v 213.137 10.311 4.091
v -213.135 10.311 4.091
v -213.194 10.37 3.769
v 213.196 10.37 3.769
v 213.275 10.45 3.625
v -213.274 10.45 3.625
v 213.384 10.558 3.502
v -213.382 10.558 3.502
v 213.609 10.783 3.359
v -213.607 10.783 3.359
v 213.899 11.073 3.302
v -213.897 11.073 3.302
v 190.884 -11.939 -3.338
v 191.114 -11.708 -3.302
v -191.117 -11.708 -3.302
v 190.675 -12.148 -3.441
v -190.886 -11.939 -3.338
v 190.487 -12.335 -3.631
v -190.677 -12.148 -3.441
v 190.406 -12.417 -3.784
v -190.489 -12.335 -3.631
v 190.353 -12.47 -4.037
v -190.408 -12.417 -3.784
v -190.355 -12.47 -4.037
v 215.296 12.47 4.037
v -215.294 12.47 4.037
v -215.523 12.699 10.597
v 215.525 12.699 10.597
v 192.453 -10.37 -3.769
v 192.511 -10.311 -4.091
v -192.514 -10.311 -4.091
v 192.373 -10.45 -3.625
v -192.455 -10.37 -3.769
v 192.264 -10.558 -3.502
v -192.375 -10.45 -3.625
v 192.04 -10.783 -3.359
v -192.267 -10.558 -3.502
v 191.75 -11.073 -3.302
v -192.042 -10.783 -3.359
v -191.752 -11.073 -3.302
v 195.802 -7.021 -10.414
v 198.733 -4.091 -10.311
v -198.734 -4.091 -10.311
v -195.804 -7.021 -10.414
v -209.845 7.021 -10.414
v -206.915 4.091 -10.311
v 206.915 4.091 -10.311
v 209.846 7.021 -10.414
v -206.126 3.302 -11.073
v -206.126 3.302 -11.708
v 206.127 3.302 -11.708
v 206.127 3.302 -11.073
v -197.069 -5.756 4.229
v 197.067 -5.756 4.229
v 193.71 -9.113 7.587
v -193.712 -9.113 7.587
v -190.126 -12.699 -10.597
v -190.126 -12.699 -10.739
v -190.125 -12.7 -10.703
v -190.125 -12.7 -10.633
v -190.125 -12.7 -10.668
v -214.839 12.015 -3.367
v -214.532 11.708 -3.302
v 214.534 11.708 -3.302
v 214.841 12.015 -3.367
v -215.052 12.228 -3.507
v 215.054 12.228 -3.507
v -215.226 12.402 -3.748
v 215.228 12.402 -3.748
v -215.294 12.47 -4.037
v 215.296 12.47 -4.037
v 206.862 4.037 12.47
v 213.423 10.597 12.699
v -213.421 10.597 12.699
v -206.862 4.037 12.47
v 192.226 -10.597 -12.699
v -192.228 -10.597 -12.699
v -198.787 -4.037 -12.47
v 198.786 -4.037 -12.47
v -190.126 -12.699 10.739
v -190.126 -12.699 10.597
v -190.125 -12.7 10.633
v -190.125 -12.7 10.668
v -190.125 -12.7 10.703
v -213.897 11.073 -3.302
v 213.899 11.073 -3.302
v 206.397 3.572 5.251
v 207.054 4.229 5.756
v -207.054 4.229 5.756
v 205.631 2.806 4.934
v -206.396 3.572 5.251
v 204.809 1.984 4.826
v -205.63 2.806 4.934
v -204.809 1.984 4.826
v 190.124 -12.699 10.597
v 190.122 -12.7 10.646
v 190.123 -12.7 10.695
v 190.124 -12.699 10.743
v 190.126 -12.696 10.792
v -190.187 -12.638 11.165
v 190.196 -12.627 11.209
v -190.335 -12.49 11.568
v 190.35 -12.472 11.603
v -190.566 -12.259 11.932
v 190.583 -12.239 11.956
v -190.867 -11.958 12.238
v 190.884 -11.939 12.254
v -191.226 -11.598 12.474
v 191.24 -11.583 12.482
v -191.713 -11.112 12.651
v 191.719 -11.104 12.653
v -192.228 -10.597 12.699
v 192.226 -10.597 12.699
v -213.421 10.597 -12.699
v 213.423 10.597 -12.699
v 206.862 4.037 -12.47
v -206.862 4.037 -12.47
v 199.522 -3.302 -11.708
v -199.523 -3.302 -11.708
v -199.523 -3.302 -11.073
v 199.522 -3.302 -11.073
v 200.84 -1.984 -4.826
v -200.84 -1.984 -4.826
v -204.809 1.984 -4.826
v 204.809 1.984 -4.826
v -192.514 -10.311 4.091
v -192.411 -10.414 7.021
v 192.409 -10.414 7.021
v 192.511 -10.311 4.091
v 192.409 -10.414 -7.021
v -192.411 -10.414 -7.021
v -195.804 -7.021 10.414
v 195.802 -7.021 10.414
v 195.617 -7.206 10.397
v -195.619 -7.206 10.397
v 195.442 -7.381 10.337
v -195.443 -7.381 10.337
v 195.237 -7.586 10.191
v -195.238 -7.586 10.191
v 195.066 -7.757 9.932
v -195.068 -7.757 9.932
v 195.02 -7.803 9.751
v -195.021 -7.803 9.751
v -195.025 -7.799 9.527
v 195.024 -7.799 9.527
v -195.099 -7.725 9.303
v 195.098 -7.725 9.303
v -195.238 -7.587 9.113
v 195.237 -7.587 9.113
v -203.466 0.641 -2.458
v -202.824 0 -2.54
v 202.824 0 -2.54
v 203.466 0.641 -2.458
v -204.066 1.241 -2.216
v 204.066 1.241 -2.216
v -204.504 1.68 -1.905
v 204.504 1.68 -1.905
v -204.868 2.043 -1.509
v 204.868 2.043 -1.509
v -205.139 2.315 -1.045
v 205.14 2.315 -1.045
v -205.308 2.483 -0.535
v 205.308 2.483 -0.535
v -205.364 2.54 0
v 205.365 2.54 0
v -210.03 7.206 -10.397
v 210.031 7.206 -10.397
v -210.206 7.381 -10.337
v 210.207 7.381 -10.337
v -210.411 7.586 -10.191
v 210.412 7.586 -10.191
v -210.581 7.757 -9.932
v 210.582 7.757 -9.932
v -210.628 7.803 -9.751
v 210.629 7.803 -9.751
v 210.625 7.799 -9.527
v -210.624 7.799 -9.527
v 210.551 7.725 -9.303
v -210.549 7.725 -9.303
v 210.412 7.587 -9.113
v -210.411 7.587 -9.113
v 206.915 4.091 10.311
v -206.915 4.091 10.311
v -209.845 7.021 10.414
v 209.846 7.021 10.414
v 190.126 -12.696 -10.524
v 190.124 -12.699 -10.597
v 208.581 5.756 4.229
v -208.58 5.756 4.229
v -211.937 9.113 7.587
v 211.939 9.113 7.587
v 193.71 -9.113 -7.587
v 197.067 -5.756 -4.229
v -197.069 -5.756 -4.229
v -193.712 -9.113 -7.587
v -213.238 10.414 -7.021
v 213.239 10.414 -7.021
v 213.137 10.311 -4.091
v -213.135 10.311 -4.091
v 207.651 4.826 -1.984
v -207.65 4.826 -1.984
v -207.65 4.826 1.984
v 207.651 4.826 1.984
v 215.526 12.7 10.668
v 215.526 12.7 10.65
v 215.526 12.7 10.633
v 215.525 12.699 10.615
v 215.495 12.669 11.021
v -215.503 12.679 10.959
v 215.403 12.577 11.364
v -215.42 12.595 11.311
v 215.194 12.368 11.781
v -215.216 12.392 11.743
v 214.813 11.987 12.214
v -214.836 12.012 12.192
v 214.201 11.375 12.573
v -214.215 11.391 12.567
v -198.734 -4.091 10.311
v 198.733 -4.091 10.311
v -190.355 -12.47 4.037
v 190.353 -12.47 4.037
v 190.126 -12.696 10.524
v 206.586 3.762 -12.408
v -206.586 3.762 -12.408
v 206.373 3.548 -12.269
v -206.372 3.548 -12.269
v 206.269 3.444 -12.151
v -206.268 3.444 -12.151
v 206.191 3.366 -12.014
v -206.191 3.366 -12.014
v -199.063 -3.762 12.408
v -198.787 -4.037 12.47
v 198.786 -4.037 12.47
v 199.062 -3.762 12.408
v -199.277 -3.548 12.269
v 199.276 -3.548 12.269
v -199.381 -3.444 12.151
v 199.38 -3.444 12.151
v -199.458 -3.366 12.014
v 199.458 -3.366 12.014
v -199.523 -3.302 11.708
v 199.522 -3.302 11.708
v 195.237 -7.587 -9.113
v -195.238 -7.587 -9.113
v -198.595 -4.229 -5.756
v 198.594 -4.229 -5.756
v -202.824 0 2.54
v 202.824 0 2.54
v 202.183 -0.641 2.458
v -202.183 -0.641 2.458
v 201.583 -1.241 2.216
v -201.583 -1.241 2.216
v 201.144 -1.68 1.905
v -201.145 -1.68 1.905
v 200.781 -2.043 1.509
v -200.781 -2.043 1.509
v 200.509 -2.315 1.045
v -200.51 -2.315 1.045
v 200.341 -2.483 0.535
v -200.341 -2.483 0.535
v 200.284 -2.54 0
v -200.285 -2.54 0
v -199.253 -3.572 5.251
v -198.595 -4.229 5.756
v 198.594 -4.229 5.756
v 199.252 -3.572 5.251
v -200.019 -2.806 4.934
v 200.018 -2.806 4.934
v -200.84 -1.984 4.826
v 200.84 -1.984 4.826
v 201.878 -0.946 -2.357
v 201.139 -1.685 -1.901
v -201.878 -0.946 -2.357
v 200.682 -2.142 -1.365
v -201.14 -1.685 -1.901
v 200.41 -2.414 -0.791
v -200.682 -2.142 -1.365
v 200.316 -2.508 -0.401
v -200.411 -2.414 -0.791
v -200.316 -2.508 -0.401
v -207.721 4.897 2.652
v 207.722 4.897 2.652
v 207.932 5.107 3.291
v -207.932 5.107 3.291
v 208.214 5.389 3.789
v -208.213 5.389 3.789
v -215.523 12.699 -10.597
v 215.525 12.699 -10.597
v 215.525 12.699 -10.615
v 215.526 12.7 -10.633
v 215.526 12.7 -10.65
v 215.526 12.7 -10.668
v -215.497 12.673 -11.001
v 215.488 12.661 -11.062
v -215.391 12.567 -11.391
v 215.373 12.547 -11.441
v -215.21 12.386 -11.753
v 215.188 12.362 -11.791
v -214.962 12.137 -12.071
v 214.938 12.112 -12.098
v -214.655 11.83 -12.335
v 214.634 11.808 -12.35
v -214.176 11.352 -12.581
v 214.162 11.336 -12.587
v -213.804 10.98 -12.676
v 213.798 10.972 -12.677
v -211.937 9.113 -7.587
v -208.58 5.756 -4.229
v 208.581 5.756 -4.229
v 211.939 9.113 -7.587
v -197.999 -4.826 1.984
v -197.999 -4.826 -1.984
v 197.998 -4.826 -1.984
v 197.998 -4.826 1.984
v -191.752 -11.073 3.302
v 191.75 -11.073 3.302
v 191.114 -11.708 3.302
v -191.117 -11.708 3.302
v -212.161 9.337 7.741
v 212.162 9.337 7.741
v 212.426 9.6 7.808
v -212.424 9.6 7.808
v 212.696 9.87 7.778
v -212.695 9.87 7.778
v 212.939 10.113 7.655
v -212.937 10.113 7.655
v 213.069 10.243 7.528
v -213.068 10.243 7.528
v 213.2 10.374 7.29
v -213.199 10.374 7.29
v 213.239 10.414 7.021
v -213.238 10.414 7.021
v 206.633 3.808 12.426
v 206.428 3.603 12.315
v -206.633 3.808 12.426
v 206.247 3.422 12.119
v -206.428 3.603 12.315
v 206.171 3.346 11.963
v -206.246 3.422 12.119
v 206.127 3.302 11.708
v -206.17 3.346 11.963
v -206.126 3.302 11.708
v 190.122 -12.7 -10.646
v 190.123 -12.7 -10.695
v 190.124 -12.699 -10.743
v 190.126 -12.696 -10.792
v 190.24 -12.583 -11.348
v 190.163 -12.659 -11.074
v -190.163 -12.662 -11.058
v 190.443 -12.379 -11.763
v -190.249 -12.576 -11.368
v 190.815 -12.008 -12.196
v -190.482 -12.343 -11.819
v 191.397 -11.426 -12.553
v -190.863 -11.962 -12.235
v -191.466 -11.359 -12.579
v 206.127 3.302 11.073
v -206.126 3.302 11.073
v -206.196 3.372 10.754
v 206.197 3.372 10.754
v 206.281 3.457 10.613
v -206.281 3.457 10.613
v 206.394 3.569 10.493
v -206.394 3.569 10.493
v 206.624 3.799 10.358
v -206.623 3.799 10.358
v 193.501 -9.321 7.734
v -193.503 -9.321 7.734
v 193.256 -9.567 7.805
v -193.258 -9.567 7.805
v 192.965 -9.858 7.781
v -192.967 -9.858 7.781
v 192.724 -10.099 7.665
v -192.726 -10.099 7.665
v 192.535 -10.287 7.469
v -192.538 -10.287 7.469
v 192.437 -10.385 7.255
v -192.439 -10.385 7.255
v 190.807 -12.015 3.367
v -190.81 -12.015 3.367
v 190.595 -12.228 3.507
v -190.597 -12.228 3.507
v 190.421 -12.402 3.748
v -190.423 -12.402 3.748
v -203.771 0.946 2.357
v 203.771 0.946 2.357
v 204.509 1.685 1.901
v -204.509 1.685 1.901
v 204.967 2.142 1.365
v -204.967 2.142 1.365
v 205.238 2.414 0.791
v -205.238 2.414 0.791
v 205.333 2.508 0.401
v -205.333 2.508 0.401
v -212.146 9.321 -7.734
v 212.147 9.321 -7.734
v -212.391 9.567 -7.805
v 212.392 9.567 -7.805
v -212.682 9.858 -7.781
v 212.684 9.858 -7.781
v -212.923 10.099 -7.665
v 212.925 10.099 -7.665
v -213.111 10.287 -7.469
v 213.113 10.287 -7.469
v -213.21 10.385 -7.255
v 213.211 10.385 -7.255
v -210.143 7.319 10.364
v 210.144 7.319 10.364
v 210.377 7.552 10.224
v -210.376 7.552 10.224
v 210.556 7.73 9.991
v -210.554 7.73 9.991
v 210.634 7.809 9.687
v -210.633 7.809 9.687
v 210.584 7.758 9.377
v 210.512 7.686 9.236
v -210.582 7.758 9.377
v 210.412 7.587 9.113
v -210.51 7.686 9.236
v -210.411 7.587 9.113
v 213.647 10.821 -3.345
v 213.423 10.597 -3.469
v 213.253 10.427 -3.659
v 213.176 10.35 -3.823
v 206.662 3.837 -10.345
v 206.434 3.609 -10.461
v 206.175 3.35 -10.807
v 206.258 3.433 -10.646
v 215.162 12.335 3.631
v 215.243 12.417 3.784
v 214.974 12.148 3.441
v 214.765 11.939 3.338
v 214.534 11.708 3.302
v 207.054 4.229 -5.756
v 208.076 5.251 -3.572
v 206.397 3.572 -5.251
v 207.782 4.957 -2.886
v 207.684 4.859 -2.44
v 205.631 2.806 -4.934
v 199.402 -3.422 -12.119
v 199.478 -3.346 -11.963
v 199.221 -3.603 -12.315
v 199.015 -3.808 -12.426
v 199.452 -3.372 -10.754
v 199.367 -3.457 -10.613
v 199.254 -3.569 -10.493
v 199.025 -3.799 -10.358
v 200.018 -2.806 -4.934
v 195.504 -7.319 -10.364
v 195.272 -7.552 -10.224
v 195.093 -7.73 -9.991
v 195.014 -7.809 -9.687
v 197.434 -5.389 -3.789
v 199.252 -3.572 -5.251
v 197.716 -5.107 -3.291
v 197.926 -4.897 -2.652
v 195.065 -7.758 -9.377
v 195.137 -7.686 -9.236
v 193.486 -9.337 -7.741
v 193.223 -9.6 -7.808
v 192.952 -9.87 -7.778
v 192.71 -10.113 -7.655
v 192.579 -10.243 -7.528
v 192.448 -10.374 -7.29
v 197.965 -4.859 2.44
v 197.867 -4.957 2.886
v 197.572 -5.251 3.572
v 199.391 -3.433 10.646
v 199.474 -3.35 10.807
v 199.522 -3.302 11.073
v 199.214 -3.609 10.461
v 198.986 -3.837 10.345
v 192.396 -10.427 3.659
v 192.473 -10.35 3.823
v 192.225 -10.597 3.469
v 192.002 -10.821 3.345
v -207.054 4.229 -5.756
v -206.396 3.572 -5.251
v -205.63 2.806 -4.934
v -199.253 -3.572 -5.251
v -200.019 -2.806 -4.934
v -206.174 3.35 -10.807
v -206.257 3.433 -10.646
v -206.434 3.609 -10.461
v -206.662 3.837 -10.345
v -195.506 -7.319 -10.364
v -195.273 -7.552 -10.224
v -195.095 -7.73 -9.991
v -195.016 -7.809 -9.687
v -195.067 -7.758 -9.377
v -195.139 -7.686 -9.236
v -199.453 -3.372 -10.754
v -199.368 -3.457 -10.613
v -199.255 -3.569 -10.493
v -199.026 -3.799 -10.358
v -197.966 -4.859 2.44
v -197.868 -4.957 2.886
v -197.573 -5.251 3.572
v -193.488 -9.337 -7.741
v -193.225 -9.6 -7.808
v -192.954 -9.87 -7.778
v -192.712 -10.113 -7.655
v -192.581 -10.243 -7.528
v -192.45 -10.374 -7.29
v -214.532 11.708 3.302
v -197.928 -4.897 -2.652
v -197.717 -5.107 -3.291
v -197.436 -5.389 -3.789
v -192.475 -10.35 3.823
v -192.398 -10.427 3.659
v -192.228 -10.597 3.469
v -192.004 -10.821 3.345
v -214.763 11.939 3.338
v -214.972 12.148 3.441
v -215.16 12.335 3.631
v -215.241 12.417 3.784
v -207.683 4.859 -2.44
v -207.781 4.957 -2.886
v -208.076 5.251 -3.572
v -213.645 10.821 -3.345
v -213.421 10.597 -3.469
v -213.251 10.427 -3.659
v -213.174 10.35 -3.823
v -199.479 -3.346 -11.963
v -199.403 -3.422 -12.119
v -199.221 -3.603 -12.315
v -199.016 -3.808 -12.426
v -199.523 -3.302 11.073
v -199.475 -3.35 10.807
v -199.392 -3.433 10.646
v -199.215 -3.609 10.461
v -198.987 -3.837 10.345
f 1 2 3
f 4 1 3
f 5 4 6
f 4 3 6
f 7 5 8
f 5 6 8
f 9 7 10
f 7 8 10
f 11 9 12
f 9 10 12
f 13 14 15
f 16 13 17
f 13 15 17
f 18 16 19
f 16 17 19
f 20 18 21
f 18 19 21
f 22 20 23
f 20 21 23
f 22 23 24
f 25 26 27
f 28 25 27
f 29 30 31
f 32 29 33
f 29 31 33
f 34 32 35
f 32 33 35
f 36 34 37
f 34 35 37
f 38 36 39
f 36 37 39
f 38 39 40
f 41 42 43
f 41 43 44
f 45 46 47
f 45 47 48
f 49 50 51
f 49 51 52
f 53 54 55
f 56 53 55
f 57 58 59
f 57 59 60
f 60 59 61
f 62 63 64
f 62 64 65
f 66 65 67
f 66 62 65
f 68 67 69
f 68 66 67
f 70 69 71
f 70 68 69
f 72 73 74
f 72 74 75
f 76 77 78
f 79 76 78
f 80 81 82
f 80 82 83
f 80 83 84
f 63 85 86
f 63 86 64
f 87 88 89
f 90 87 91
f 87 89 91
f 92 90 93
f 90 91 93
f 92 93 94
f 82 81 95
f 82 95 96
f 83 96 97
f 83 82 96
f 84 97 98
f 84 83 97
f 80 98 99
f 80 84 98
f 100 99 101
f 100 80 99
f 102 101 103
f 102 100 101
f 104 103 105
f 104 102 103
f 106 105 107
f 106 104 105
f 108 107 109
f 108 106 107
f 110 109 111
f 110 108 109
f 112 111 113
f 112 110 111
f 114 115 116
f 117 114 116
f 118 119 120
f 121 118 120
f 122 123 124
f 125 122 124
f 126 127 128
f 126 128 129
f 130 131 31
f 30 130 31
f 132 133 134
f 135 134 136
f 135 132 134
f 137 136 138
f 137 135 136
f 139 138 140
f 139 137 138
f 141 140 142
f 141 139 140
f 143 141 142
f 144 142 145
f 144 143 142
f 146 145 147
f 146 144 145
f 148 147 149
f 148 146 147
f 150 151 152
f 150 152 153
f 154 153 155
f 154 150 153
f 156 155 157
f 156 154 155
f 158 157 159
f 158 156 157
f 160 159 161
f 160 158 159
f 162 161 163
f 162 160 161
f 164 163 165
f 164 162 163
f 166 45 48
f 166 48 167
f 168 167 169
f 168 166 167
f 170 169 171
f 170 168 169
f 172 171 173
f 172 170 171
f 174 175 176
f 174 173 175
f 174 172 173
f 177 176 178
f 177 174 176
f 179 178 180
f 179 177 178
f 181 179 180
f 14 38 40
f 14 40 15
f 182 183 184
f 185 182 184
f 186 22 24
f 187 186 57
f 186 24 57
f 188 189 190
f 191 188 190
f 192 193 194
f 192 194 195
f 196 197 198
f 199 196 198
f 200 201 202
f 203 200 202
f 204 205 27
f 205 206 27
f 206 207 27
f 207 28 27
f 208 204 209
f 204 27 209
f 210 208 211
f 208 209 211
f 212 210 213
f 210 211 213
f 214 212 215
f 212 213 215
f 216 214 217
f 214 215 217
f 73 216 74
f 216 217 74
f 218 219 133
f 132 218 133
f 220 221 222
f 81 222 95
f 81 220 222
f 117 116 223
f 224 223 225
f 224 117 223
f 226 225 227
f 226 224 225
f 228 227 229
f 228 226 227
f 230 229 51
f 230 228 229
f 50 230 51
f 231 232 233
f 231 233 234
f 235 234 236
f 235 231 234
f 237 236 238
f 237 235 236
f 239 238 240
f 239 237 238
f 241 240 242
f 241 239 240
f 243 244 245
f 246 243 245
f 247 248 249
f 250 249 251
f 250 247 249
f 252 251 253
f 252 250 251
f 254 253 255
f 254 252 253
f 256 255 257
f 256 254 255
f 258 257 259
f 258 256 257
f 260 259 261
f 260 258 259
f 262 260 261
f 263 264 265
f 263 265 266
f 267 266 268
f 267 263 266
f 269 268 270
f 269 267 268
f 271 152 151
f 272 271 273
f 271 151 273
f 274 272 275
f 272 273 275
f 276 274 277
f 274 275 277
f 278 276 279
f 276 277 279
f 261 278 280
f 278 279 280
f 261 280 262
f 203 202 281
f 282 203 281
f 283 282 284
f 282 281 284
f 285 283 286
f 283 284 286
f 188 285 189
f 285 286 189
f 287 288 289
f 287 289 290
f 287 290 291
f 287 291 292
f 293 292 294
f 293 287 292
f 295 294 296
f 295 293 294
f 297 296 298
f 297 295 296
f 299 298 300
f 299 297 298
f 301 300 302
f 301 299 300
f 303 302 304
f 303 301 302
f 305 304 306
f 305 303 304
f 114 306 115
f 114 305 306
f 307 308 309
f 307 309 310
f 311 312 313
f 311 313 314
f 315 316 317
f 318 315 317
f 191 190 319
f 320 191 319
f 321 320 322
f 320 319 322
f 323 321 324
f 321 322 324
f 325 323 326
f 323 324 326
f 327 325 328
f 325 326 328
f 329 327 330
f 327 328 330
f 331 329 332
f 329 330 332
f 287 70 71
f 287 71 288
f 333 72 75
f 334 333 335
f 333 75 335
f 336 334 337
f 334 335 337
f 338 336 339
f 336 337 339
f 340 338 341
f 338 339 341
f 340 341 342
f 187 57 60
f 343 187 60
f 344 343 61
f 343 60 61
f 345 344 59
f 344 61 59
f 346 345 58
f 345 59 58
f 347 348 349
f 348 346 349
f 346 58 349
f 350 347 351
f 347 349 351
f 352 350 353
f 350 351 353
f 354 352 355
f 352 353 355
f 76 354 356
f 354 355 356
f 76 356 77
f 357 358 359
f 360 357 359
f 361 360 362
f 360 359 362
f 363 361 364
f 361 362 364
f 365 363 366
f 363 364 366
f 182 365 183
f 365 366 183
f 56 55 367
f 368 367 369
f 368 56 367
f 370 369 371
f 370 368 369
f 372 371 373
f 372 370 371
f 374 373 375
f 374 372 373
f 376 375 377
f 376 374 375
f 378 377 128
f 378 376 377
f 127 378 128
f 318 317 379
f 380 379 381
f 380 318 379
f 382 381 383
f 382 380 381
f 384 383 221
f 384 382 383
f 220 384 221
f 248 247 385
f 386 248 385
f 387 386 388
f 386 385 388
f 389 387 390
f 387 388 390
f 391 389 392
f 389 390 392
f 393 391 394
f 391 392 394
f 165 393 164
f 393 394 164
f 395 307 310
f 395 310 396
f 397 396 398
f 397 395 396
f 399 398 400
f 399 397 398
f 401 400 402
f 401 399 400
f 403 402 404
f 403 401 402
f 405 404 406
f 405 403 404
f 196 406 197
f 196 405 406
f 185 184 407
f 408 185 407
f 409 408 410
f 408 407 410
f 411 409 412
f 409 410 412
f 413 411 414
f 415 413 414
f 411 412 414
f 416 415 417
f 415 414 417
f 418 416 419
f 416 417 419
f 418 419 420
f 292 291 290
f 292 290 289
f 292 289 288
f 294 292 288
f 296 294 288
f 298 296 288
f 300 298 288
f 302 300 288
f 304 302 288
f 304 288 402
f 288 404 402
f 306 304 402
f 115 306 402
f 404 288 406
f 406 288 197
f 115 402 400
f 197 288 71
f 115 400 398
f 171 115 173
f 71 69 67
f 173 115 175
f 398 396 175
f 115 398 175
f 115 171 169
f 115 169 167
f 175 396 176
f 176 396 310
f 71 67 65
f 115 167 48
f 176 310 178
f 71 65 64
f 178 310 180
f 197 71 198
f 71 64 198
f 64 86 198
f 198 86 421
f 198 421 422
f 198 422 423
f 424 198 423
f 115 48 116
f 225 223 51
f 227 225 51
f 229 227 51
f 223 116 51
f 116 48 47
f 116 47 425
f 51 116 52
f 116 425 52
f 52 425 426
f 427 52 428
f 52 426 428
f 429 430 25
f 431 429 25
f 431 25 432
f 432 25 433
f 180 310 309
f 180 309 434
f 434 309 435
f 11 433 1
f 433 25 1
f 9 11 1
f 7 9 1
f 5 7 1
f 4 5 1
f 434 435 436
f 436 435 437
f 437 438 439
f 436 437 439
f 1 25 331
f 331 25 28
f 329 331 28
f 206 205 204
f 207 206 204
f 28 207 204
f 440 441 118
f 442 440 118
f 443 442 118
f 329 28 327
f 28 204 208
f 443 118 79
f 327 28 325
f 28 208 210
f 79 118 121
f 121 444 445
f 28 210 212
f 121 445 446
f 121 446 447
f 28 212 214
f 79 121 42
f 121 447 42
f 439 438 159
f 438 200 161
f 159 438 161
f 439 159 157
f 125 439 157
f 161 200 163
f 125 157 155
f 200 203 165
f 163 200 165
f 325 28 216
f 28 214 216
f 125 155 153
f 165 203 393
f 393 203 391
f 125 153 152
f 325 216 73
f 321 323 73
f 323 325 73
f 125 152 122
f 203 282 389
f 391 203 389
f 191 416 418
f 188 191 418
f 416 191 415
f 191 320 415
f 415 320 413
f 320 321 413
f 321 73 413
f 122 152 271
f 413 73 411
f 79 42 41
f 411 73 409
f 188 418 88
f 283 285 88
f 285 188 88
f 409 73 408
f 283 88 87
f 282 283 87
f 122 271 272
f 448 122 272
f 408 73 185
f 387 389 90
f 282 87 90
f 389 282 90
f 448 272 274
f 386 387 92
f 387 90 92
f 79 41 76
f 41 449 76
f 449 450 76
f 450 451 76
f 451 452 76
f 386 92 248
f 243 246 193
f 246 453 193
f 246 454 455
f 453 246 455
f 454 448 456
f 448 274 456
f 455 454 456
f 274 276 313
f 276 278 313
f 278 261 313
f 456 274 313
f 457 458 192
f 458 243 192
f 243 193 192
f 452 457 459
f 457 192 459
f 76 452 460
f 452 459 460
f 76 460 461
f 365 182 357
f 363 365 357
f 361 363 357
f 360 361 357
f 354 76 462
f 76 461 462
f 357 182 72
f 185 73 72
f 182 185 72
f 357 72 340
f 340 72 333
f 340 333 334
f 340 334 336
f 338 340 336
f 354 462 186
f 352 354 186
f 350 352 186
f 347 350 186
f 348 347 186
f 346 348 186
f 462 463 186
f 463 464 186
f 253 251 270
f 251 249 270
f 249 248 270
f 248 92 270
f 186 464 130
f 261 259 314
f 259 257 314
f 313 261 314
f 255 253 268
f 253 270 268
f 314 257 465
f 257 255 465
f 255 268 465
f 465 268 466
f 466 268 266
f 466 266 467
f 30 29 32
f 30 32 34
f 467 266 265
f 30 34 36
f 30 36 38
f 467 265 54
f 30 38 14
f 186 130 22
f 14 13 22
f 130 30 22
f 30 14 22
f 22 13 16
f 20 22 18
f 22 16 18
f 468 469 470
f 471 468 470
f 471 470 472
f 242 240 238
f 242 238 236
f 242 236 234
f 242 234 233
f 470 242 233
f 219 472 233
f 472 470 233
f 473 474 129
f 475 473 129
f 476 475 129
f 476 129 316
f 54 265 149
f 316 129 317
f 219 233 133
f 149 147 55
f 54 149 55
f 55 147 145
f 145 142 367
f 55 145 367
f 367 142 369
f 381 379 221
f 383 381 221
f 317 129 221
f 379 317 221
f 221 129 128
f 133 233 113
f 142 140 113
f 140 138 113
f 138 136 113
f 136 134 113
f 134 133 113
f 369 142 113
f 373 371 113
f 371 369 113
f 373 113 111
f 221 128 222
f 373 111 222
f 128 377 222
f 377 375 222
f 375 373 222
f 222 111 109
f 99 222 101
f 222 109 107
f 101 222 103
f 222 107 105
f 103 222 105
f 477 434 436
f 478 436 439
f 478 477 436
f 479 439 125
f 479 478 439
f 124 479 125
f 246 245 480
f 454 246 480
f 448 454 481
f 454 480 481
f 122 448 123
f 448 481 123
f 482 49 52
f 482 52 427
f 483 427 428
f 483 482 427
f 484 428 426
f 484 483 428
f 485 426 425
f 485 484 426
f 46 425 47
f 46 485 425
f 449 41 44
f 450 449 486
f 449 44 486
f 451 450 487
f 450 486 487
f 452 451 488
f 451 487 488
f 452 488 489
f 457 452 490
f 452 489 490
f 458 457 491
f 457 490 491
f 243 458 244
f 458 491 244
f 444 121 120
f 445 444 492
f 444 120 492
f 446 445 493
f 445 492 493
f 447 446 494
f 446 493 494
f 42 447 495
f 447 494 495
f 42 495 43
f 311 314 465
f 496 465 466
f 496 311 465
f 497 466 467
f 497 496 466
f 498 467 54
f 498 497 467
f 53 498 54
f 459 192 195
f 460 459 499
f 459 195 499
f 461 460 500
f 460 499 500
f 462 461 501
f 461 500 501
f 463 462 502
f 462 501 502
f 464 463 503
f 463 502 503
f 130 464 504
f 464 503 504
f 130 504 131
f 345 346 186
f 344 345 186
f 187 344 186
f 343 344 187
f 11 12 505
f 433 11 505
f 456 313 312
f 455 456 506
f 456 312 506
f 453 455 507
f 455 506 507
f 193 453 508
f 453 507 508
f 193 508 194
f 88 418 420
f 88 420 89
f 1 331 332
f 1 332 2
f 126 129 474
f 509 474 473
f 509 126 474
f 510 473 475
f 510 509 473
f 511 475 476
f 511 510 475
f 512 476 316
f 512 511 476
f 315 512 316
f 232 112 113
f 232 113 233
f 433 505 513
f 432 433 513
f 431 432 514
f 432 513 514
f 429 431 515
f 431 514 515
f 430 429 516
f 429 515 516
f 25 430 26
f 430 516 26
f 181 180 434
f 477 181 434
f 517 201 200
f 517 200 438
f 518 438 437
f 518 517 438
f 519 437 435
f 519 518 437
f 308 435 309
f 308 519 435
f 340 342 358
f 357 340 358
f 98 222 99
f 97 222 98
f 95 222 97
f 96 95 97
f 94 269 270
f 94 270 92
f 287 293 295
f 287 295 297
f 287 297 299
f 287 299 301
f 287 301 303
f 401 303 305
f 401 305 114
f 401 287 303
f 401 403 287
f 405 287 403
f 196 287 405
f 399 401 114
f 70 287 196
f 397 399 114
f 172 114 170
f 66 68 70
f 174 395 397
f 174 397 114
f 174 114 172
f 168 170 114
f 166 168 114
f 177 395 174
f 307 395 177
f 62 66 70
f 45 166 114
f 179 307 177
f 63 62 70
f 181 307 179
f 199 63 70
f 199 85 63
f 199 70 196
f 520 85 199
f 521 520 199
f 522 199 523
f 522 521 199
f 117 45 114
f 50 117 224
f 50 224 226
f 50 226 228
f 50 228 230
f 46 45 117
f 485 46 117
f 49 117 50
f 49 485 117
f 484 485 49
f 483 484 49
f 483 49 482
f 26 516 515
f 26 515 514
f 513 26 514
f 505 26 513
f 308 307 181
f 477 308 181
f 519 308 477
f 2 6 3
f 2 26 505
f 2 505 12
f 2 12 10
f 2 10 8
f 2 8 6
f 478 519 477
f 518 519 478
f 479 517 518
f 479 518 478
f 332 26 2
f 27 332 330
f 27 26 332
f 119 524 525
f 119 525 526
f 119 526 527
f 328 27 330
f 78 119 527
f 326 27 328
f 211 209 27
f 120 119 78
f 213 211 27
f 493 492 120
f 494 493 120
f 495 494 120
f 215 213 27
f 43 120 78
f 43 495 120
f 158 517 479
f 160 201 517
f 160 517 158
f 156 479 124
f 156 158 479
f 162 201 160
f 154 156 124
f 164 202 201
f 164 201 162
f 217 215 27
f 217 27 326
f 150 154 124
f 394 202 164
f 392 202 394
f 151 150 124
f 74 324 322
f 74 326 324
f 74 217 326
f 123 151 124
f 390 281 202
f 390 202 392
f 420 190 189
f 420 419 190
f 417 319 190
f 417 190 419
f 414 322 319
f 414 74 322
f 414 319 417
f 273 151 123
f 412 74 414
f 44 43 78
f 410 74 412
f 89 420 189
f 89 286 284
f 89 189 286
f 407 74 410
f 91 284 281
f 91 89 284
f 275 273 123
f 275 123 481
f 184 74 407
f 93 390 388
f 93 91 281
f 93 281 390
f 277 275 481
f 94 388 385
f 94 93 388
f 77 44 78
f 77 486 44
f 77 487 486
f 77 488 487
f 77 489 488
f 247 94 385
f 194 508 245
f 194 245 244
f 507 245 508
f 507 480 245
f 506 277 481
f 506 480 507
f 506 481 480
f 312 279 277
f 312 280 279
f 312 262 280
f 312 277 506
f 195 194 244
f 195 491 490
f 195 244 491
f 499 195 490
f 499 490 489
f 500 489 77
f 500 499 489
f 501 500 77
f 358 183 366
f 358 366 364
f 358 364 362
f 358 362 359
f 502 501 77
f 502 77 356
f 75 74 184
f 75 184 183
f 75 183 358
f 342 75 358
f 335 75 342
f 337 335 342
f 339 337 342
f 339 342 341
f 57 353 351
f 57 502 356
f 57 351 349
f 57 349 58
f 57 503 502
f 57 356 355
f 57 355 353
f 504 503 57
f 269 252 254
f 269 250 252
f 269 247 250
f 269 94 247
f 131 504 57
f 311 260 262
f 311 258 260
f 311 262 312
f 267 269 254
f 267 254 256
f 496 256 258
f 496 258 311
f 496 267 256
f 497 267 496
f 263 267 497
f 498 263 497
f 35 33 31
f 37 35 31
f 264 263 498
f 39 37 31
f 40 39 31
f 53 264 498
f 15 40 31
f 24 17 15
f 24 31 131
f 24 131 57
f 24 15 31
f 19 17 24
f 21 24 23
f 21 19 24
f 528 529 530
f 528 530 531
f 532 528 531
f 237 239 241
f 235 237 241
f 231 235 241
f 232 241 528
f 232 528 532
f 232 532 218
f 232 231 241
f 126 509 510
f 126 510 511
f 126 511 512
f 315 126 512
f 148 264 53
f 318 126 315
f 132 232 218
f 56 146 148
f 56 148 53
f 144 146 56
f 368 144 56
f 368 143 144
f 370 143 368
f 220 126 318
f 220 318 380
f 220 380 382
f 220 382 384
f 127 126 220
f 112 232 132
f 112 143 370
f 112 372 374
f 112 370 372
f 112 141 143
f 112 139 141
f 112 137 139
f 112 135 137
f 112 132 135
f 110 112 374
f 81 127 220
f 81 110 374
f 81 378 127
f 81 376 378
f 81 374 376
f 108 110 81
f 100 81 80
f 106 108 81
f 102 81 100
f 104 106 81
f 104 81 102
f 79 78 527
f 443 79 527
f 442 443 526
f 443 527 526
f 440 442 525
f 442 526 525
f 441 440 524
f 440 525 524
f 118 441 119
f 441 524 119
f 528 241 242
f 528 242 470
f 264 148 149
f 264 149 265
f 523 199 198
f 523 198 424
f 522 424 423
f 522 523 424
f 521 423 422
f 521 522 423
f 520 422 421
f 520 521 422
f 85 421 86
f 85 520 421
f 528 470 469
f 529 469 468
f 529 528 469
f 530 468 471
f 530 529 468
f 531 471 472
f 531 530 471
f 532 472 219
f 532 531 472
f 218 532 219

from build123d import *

# Parameters (mm, degrees)
BOSS_EXTRUDE1_DEPTH      = 215.526147
BOSS_EXTRUDE1_DEPTH_BACK = 215.526147
CUT_EXTRUDE2_DEPTH       = 218.388838628
CUT_EXTRUDE2_DEPTH_BACK  = 218.388838628
CUT_EXTRUDE3_DEPTH       = 218.388838628
CUT_EXTRUDE3_DEPTH_BACK  = 218.388838628


with BuildPart() as part:
    # Sketch3 → Boss-Extrude1 (new, two sides: drawn at the far end of the back side and taken through both)
    with BuildSketch(Plane(origin=(0, 0, 0), x_dir=(0, 0, -1), z_dir=(1, 0, 0)).offset(-BOSS_EXTRUDE1_DEPTH_BACK)):
        with BuildLine():
            Line((0, 4.826), (1.984228399, 4.826))
            ThreePointArc((1.984228399, 4.826), (3.199248297, 5.067682484), (4.229292429, 5.75593597))
            Line((4.229292429, 5.75593597), (7.586577723, 9.113221264))
            ThreePointArc((7.586577723, 9.113221264), (7.746562132, 9.955883421), (7.021168939, 10.413572441))
            Line((7.021168939, 10.413572441), (4.090593416, 10.311234489))
            ThreePointArc((4.090593416, 10.311234489), (3.534670322, 10.524633371), (3.302, 11.072770299))
            Line((3.302, 11.072770299), (3.302, 11.70815736))
            ThreePointArc((3.302, 11.70815736), (3.515863072, 12.237487038), (4.037406584, 12.46969317))
            Line((4.037406584, 12.46969317), (10.597084223, 12.698762161))
            ThreePointArc((10.597084223, 12.698762161), (12.104840979, 12.104840979), (12.698762161, 10.597084223))
            Line((12.698762161, 10.597084223), (12.46969317, 4.037406584))
            ThreePointArc((12.46969317, 4.037406584), (12.237487038, 3.515863072), (11.70815736, 3.302))
            Line((11.70815736, 3.302), (11.072770299, 3.302))
            ThreePointArc((11.072770299, 3.302), (10.524633371, 3.534670322), (10.311234489, 4.090593416))
            Line((10.311234489, 4.090593416), (10.413572441, 7.021168939))
            ThreePointArc((10.413572441, 7.021168939), (9.955883421, 7.746562132), (9.113221264, 7.586577723))
            Line((9.113221264, 7.586577723), (5.75593597, 4.229292429))
            ThreePointArc((5.75593597, 4.229292429), (5.067682484, 3.199248297), (4.826, 1.984228399))
            Line((4.826, 1.984228399), (4.826, 0))
            Line((4.826, 0), (2.54, 0))
            ThreePointArc((2.54, 0), (1.796051224, 1.796051224), (0, 2.54))
            Line((0, 2.54), (0, 4.826))
        make_face()
    extrude(amount=BOSS_EXTRUDE1_DEPTH + BOSS_EXTRUDE1_DEPTH_BACK)

    # Mirror1: part across plane


with BuildPart() as part_1:
    add(part.part)
    add(part.part.mirror(Plane.ZX))

    # Mirror2: part across plane


with BuildPart() as part_2:
    add(part_1.part)
    add(part_1.part.mirror(Plane.XY))

    # Sketch13 → Cut-Extrude2 (cut, two sides: drawn at the far end of the back side and taken through both)
    with BuildSketch(Plane(origin=(0, 0, -12.698762161), x_dir=(-1, 0, 0), z_dir=(0, 0, -1)).offset(-CUT_EXTRUDE2_DEPTH_BACK)):
        Polygon((-833.300812031, 630.382299777), (-215.526146906, 12.7), (-190.126146906, -12.69620237), (427.64851822, -630.378502147), (-807.716081334, -1865.927832398), (-2068.665411586, -605.167030474), align=None)
    extrude(amount=CUT_EXTRUDE2_DEPTH + CUT_EXTRUDE2_DEPTH_BACK, mode=Mode.SUBTRACT)

    # Sketch16 → Cut-Extrude3 (cut, two sides: drawn at the far end of the back side and taken through both)
    with BuildSketch(Plane(origin=(0, 0, -12.698762161), x_dir=(-1, 0, 0), z_dir=(0, 0, -1)).offset(-CUT_EXTRUDE3_DEPTH_BACK)):
        Polygon((215.526146906, -886.298616536), (215.526146906, -12.698762161), (215.526146906, 12.702063115), (190.126146906, -12.698762161), (-427.592198896, -630.437178341), (-1073.468846893, -2253.87494365), (-430.350501092, -2509.736381844), align=None)
    extrude(amount=CUT_EXTRUDE3_DEPTH + CUT_EXTRUDE3_DEPTH_BACK, mode=Mode.SUBTRACT)


solid = part_2.part
